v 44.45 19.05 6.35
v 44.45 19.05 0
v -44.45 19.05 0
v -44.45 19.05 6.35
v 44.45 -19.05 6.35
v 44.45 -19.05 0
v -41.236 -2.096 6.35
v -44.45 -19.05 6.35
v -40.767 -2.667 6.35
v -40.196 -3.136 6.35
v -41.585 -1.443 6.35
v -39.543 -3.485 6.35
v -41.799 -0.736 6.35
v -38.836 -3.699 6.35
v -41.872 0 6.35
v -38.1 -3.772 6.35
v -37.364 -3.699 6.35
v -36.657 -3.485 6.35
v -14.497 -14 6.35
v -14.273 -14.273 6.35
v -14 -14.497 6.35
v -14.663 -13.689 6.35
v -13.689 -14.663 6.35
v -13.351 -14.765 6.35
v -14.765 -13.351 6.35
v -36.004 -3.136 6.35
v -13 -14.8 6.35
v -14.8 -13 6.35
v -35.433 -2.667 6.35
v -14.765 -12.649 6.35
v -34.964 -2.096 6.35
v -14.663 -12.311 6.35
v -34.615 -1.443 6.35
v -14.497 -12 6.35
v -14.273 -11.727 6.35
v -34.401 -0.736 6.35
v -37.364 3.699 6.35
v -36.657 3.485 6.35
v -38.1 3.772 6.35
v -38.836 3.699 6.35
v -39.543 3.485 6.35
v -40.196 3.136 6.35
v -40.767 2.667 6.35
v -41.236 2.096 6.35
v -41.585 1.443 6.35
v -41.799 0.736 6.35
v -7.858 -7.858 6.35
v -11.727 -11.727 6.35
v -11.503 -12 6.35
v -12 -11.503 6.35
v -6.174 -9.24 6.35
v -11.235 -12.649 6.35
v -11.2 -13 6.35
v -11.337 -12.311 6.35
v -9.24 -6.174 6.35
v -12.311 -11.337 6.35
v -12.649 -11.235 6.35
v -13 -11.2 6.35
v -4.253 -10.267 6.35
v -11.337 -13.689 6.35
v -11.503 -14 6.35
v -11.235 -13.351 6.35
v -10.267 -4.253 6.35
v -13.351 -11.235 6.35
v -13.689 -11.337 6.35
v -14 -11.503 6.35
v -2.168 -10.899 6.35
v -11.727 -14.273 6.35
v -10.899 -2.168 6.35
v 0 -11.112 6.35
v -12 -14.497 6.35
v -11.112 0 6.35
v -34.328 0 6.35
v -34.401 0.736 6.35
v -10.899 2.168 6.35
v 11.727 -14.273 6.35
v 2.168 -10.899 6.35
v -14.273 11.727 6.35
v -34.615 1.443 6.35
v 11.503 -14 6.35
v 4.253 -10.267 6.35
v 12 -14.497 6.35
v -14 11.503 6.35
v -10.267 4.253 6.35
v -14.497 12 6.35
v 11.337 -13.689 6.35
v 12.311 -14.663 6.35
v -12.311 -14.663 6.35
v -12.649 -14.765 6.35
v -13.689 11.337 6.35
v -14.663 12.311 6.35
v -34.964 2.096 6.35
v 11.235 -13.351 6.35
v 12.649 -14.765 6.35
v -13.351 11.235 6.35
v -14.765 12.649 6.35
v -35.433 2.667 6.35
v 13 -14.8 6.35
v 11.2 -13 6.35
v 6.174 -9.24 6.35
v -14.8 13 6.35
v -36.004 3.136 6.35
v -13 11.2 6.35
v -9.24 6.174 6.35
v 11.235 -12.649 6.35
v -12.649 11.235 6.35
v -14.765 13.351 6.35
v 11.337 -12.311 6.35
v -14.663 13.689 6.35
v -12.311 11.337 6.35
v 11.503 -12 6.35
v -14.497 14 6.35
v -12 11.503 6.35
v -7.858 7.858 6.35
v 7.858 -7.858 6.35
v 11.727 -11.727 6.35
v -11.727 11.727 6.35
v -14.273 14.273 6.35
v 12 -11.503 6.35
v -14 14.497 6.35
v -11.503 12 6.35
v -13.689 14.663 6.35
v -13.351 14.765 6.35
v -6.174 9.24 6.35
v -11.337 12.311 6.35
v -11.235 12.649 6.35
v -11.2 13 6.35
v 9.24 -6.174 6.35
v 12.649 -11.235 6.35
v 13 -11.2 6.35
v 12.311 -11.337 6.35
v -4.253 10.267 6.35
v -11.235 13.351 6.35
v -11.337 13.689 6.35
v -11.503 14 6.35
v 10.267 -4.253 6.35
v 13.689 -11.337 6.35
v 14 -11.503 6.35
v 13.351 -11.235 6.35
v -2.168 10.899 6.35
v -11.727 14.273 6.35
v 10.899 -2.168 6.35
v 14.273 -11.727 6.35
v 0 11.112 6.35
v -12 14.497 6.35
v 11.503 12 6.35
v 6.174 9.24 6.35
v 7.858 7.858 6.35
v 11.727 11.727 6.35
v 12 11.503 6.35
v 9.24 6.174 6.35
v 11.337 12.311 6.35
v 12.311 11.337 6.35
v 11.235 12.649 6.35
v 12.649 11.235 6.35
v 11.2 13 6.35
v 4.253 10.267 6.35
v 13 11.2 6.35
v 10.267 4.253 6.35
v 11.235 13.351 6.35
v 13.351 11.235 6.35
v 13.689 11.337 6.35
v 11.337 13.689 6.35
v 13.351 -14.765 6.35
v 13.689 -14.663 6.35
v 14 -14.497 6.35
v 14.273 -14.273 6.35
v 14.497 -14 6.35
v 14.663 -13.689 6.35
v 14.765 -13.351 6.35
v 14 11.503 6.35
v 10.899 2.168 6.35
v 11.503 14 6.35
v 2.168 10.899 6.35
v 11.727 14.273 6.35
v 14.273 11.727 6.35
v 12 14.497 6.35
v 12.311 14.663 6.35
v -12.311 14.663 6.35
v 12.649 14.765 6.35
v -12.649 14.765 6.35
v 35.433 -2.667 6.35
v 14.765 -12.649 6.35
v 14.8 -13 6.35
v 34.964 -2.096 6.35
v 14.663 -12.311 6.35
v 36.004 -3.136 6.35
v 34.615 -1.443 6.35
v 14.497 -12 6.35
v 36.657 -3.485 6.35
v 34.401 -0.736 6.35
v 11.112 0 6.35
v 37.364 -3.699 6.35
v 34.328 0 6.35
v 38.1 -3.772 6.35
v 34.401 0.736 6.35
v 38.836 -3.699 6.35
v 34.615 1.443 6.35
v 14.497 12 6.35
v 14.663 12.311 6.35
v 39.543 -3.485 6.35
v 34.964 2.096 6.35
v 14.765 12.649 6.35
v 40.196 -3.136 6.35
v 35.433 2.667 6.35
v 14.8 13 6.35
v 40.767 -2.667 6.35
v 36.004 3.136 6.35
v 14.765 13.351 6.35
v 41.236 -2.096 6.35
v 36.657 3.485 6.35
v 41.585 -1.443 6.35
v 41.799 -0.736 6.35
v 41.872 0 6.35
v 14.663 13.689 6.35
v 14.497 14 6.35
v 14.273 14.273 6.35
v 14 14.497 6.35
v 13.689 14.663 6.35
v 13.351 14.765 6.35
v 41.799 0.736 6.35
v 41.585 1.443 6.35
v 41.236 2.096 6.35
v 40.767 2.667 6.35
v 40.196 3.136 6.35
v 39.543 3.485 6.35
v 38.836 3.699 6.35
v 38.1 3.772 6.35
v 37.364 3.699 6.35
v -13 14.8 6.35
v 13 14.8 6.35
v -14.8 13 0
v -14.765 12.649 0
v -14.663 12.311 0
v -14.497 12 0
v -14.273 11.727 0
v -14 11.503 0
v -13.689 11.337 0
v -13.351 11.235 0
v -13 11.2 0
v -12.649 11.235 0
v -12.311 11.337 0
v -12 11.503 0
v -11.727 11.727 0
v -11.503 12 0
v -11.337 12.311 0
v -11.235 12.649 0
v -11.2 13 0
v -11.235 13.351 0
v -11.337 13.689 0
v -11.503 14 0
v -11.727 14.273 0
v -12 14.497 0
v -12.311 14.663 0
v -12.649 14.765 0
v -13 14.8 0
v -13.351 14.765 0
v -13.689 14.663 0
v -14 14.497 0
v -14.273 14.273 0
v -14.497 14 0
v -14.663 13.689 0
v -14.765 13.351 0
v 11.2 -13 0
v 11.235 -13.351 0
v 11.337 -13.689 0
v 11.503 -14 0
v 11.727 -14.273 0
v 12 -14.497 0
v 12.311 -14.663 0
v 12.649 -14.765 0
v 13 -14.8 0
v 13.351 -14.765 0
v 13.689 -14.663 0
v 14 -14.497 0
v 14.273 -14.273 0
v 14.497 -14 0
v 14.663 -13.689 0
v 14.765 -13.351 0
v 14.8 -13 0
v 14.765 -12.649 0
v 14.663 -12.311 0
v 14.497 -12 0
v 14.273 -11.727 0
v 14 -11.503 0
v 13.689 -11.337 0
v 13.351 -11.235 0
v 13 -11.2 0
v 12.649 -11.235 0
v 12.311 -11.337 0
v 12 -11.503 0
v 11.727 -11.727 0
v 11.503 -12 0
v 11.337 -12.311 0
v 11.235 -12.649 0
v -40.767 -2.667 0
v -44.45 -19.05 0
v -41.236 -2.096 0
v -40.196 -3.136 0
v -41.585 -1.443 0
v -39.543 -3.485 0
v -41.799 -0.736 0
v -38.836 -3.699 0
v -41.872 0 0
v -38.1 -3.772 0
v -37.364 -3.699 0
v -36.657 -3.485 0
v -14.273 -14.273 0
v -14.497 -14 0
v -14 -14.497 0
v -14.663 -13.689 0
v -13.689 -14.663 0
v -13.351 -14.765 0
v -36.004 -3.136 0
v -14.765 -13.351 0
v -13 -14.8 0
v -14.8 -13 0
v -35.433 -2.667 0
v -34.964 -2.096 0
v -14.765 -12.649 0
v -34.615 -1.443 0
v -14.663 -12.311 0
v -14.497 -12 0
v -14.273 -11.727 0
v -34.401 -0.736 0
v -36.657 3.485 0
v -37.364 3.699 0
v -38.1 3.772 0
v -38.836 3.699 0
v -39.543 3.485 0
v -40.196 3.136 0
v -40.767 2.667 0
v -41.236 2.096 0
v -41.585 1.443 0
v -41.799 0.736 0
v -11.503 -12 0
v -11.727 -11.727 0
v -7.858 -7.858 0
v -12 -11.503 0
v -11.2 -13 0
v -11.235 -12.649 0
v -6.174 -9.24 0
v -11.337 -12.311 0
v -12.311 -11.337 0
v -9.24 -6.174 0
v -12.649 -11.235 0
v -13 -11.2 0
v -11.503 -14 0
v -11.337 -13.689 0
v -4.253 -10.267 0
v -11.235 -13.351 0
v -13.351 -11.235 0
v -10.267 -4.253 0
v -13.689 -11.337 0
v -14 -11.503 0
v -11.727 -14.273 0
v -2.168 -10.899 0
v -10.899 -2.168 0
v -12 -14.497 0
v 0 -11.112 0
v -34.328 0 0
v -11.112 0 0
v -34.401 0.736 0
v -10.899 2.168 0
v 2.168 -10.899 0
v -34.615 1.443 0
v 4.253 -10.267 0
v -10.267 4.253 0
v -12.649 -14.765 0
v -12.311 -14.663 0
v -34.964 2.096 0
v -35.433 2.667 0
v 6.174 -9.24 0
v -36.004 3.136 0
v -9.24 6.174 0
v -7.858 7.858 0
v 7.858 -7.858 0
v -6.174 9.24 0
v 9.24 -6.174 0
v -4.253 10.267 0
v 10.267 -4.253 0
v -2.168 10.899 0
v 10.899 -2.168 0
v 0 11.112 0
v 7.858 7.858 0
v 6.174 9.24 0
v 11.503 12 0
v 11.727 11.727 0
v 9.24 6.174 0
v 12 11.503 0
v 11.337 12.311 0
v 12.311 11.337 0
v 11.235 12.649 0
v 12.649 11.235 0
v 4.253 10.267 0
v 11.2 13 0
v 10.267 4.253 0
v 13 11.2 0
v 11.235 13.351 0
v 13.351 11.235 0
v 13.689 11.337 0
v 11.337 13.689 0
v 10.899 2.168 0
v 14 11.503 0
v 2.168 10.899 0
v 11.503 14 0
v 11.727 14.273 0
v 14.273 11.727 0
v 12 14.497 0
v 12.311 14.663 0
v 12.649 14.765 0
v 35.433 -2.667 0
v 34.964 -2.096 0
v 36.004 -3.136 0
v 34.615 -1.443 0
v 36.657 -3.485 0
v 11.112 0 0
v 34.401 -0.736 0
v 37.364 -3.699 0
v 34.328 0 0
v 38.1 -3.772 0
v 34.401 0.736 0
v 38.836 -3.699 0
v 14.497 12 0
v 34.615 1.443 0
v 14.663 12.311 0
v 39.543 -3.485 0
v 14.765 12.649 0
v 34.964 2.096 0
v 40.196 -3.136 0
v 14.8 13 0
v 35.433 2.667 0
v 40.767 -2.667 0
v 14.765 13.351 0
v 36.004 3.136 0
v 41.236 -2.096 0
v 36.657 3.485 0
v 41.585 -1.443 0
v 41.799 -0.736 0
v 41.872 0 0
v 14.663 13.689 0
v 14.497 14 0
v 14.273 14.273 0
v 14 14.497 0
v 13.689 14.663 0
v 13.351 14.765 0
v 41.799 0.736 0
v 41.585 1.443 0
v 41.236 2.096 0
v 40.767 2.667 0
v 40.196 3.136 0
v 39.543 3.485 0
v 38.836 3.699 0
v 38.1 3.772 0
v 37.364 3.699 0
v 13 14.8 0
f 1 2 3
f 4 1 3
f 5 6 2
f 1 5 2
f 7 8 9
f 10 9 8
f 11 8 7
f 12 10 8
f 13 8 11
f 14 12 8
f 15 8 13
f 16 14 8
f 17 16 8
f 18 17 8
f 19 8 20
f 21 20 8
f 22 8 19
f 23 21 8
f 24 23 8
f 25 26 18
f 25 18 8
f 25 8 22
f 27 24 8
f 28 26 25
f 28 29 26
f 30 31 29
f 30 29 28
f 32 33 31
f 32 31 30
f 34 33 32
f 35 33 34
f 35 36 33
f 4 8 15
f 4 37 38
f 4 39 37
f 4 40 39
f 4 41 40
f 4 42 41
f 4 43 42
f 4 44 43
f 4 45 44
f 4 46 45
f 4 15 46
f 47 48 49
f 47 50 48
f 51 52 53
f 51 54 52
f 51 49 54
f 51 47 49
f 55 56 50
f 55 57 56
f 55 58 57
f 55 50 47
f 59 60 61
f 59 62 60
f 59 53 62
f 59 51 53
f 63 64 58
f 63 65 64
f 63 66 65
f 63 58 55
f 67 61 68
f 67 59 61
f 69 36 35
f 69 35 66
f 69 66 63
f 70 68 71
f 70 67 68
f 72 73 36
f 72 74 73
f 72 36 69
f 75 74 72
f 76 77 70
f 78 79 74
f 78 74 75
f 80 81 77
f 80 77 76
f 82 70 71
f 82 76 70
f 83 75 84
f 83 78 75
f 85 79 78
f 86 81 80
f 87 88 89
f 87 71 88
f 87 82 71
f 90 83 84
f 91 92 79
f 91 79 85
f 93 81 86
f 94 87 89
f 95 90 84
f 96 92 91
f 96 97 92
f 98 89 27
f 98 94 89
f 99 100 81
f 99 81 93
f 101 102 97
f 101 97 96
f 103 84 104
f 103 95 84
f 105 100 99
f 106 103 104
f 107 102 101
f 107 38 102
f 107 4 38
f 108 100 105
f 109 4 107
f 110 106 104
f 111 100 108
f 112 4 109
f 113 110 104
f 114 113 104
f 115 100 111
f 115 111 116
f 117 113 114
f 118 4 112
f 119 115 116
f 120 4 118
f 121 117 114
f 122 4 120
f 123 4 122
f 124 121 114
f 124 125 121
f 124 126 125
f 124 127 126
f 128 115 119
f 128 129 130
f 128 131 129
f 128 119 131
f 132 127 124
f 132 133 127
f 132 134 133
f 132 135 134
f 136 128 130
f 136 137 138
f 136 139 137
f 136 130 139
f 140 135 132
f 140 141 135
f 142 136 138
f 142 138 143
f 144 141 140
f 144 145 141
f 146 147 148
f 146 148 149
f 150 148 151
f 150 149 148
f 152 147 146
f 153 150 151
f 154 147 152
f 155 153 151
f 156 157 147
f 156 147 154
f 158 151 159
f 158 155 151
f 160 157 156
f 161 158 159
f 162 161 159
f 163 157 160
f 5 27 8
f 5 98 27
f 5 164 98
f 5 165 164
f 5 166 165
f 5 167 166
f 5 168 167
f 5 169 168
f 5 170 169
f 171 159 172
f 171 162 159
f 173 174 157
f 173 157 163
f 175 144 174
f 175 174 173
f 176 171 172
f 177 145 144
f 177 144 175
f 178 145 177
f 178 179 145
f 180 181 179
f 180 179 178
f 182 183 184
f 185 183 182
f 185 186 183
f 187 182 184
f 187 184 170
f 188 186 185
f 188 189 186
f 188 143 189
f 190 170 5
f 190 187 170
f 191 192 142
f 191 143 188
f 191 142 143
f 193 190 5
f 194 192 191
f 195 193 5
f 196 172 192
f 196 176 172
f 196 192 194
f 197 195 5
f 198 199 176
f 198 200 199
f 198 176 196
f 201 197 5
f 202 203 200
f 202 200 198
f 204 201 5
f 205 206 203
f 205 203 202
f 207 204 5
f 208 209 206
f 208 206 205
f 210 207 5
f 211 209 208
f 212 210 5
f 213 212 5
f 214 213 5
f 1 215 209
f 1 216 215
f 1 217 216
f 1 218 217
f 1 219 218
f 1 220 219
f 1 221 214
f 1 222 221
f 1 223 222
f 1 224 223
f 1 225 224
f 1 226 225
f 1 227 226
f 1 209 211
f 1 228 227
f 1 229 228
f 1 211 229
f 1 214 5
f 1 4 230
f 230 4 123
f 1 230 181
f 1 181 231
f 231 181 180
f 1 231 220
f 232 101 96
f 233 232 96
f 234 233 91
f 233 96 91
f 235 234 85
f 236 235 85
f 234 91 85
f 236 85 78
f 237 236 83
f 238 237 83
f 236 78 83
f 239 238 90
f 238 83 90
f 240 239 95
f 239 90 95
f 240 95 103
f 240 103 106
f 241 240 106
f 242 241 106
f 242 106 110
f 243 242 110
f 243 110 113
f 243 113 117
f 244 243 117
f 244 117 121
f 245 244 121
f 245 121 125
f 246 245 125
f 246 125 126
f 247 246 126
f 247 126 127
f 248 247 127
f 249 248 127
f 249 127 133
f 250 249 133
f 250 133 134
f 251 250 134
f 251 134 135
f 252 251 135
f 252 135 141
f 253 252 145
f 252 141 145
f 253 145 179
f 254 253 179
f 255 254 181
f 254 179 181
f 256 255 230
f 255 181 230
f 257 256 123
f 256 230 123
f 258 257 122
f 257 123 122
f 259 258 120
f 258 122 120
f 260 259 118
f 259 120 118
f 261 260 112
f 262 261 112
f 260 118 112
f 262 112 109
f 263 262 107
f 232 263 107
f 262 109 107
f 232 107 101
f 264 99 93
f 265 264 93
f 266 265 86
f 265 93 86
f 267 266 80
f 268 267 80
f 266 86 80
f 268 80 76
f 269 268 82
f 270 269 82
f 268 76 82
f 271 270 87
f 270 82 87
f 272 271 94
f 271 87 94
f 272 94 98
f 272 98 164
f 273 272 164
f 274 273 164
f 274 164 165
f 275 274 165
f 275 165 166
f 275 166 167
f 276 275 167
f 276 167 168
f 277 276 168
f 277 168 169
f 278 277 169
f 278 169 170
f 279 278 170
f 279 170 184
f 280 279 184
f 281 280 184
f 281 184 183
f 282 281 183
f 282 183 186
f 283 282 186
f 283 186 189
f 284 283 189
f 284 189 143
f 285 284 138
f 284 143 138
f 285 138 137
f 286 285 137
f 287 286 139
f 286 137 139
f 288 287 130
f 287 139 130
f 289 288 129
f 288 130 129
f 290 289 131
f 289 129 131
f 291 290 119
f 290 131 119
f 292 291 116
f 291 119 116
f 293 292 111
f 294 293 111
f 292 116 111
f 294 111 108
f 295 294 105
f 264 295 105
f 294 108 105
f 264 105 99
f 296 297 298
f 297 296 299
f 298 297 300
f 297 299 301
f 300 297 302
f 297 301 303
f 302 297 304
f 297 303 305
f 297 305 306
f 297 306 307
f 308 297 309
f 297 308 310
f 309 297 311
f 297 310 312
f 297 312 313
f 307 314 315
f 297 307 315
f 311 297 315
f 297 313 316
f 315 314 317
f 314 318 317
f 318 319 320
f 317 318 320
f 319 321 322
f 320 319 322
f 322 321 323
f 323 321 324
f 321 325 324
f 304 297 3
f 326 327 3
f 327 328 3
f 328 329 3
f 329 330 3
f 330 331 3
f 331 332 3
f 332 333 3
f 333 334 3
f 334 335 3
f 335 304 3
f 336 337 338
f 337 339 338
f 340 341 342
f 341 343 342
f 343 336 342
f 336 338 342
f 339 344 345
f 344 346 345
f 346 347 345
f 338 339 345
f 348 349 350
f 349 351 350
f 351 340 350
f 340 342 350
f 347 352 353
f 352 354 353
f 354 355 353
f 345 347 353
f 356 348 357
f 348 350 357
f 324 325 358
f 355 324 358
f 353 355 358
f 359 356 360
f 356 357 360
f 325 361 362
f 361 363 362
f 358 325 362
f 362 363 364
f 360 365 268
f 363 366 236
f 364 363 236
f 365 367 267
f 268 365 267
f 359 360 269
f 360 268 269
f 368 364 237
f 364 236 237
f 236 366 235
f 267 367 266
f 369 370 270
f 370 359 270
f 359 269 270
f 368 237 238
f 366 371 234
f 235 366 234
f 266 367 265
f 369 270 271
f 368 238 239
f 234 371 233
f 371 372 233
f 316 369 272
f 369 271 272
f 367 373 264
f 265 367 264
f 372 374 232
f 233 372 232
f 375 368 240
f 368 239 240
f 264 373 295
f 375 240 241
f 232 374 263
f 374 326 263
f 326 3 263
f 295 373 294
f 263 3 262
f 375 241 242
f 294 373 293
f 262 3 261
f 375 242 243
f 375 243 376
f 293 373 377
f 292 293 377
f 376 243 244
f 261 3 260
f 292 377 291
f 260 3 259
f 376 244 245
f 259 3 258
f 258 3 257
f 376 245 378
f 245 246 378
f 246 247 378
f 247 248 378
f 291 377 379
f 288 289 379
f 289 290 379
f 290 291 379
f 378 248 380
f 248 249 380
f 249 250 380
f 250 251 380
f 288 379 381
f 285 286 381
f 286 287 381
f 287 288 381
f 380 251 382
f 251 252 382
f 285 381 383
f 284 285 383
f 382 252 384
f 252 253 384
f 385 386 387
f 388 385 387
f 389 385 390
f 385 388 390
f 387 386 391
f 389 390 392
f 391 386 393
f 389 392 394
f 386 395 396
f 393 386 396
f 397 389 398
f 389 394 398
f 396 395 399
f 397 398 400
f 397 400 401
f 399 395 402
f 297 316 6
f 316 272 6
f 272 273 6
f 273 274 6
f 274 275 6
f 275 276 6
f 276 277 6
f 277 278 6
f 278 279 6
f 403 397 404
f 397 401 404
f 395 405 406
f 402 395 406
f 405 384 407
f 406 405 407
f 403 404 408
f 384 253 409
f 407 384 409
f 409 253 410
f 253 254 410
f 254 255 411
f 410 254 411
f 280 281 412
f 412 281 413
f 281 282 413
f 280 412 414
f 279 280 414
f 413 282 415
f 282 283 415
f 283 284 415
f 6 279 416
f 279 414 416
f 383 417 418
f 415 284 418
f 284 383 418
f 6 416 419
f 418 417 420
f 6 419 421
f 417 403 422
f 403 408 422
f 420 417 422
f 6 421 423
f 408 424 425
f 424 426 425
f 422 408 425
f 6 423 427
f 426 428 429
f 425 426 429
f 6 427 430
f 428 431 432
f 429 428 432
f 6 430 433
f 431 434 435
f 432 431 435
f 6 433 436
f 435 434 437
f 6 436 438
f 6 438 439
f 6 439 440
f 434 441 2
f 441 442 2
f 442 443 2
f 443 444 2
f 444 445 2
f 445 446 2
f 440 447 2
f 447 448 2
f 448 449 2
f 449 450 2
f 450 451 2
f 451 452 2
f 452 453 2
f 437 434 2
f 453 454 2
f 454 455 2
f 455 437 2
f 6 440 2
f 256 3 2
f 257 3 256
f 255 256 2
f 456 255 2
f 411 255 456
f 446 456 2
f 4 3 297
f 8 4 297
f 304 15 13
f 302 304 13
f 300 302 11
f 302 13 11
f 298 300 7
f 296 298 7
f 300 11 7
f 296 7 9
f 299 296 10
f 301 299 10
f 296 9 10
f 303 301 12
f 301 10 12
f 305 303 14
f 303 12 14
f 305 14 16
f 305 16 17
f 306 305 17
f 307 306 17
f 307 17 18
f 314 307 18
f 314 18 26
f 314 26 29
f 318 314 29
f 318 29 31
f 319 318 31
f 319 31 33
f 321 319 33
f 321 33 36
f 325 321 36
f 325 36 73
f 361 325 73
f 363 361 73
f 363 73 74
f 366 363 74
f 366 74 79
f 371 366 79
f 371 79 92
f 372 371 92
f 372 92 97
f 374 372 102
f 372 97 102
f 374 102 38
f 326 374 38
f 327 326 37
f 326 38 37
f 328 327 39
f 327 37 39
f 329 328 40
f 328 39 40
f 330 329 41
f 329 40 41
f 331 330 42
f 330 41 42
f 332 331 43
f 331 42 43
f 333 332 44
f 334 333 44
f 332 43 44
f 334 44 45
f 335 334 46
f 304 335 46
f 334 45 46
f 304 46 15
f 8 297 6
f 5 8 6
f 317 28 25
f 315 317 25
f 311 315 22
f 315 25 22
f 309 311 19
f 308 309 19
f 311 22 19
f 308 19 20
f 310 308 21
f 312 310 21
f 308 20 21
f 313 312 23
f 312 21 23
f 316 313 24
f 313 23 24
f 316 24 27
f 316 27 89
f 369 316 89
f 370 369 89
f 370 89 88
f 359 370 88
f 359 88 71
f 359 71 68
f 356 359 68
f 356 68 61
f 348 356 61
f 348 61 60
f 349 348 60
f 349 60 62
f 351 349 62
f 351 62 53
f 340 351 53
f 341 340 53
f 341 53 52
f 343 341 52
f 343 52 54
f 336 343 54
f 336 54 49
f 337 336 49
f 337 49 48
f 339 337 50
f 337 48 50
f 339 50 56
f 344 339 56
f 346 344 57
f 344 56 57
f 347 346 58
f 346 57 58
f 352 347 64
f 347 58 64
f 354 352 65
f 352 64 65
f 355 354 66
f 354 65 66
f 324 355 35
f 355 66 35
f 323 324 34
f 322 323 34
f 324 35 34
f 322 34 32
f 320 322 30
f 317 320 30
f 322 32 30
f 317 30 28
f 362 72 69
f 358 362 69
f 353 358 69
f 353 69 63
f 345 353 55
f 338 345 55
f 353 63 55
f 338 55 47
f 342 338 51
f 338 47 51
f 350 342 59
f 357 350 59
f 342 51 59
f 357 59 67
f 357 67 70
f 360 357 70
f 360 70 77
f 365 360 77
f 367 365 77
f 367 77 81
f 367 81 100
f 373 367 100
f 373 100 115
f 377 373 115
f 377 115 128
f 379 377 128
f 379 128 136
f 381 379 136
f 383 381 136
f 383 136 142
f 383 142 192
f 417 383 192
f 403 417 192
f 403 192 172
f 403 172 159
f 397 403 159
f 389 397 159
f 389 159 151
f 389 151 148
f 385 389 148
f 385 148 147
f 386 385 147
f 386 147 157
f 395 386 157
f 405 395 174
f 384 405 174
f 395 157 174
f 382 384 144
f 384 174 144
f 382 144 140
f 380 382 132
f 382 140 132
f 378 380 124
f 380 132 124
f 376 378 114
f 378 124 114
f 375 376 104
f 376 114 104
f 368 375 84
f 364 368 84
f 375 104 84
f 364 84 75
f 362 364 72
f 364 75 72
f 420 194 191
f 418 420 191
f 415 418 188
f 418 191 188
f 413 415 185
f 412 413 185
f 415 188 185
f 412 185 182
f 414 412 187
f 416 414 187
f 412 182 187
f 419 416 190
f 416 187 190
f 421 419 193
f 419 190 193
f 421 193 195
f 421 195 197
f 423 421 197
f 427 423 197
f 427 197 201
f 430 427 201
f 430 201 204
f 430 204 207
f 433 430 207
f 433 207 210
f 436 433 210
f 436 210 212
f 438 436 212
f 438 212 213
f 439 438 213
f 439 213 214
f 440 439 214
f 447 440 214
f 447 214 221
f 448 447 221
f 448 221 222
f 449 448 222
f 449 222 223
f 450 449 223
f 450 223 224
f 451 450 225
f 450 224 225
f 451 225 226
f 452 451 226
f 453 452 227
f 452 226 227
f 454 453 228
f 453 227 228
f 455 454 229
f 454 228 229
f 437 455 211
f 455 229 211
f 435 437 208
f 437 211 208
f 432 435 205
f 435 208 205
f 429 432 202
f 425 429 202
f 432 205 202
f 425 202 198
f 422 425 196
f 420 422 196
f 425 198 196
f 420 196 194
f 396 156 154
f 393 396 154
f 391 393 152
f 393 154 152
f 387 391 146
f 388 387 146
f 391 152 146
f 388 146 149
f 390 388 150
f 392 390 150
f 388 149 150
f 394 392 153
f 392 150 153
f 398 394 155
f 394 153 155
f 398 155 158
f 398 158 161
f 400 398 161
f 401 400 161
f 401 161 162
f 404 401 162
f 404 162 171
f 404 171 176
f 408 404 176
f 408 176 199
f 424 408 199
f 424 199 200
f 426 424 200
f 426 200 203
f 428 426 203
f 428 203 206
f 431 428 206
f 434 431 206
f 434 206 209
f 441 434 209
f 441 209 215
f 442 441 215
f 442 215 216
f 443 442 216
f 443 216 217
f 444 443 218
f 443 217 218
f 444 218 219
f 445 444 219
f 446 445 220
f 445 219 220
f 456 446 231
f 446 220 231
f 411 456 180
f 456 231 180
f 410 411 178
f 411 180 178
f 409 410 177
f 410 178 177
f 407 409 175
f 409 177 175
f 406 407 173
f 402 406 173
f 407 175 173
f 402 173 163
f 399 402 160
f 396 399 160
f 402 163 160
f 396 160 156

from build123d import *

# Parameters (mm, degrees)
F1_DEPTH = 6.35
F2_D     = 3.6
F3_D     = 7.5438
F4_D     = 22.225


# Not quite as in the source:
# - a length typed as a fraction of an inch, garbled in the dataset ("3 / 203.2 mm" for 3/8 in), is restored


with BuildPart() as f1:
    # F0 (on Top) → F1 (new body)
    with BuildSketch(Plane.XY):
        Polygon((44.45, 13), (44.45, 19.05), (-44.45, 19.05), (-44.45, -19.05), (44.45, -19.05), align=None)
    extrude(amount=F1_DEPTH)

    # F2 (through all)
    with Locations(Plane(origin=(0, 0, 0), x_dir=(1, 0, 0), z_dir=(0, 0, -1))):
        with Locations((-13, -13), (13, -13), (13, 13), (-13, 13)):
            Hole(F2_D / 2)

    # F3 (through all)
    with Locations(Plane(origin=(0, 0, 0), x_dir=(1, 0, 0), z_dir=(0, 0, -1))):
        with Locations((-38.1, 0), (38.1, 0)):
            Hole(F3_D / 2)

    # F4 (through all)
    with Locations(Plane(origin=(0, 0, 0), x_dir=(1, 0, 0), z_dir=(0, 0, -1))):
        with Locations((0, 0)):
            Hole(F4_D / 2)


solid = f1.part
